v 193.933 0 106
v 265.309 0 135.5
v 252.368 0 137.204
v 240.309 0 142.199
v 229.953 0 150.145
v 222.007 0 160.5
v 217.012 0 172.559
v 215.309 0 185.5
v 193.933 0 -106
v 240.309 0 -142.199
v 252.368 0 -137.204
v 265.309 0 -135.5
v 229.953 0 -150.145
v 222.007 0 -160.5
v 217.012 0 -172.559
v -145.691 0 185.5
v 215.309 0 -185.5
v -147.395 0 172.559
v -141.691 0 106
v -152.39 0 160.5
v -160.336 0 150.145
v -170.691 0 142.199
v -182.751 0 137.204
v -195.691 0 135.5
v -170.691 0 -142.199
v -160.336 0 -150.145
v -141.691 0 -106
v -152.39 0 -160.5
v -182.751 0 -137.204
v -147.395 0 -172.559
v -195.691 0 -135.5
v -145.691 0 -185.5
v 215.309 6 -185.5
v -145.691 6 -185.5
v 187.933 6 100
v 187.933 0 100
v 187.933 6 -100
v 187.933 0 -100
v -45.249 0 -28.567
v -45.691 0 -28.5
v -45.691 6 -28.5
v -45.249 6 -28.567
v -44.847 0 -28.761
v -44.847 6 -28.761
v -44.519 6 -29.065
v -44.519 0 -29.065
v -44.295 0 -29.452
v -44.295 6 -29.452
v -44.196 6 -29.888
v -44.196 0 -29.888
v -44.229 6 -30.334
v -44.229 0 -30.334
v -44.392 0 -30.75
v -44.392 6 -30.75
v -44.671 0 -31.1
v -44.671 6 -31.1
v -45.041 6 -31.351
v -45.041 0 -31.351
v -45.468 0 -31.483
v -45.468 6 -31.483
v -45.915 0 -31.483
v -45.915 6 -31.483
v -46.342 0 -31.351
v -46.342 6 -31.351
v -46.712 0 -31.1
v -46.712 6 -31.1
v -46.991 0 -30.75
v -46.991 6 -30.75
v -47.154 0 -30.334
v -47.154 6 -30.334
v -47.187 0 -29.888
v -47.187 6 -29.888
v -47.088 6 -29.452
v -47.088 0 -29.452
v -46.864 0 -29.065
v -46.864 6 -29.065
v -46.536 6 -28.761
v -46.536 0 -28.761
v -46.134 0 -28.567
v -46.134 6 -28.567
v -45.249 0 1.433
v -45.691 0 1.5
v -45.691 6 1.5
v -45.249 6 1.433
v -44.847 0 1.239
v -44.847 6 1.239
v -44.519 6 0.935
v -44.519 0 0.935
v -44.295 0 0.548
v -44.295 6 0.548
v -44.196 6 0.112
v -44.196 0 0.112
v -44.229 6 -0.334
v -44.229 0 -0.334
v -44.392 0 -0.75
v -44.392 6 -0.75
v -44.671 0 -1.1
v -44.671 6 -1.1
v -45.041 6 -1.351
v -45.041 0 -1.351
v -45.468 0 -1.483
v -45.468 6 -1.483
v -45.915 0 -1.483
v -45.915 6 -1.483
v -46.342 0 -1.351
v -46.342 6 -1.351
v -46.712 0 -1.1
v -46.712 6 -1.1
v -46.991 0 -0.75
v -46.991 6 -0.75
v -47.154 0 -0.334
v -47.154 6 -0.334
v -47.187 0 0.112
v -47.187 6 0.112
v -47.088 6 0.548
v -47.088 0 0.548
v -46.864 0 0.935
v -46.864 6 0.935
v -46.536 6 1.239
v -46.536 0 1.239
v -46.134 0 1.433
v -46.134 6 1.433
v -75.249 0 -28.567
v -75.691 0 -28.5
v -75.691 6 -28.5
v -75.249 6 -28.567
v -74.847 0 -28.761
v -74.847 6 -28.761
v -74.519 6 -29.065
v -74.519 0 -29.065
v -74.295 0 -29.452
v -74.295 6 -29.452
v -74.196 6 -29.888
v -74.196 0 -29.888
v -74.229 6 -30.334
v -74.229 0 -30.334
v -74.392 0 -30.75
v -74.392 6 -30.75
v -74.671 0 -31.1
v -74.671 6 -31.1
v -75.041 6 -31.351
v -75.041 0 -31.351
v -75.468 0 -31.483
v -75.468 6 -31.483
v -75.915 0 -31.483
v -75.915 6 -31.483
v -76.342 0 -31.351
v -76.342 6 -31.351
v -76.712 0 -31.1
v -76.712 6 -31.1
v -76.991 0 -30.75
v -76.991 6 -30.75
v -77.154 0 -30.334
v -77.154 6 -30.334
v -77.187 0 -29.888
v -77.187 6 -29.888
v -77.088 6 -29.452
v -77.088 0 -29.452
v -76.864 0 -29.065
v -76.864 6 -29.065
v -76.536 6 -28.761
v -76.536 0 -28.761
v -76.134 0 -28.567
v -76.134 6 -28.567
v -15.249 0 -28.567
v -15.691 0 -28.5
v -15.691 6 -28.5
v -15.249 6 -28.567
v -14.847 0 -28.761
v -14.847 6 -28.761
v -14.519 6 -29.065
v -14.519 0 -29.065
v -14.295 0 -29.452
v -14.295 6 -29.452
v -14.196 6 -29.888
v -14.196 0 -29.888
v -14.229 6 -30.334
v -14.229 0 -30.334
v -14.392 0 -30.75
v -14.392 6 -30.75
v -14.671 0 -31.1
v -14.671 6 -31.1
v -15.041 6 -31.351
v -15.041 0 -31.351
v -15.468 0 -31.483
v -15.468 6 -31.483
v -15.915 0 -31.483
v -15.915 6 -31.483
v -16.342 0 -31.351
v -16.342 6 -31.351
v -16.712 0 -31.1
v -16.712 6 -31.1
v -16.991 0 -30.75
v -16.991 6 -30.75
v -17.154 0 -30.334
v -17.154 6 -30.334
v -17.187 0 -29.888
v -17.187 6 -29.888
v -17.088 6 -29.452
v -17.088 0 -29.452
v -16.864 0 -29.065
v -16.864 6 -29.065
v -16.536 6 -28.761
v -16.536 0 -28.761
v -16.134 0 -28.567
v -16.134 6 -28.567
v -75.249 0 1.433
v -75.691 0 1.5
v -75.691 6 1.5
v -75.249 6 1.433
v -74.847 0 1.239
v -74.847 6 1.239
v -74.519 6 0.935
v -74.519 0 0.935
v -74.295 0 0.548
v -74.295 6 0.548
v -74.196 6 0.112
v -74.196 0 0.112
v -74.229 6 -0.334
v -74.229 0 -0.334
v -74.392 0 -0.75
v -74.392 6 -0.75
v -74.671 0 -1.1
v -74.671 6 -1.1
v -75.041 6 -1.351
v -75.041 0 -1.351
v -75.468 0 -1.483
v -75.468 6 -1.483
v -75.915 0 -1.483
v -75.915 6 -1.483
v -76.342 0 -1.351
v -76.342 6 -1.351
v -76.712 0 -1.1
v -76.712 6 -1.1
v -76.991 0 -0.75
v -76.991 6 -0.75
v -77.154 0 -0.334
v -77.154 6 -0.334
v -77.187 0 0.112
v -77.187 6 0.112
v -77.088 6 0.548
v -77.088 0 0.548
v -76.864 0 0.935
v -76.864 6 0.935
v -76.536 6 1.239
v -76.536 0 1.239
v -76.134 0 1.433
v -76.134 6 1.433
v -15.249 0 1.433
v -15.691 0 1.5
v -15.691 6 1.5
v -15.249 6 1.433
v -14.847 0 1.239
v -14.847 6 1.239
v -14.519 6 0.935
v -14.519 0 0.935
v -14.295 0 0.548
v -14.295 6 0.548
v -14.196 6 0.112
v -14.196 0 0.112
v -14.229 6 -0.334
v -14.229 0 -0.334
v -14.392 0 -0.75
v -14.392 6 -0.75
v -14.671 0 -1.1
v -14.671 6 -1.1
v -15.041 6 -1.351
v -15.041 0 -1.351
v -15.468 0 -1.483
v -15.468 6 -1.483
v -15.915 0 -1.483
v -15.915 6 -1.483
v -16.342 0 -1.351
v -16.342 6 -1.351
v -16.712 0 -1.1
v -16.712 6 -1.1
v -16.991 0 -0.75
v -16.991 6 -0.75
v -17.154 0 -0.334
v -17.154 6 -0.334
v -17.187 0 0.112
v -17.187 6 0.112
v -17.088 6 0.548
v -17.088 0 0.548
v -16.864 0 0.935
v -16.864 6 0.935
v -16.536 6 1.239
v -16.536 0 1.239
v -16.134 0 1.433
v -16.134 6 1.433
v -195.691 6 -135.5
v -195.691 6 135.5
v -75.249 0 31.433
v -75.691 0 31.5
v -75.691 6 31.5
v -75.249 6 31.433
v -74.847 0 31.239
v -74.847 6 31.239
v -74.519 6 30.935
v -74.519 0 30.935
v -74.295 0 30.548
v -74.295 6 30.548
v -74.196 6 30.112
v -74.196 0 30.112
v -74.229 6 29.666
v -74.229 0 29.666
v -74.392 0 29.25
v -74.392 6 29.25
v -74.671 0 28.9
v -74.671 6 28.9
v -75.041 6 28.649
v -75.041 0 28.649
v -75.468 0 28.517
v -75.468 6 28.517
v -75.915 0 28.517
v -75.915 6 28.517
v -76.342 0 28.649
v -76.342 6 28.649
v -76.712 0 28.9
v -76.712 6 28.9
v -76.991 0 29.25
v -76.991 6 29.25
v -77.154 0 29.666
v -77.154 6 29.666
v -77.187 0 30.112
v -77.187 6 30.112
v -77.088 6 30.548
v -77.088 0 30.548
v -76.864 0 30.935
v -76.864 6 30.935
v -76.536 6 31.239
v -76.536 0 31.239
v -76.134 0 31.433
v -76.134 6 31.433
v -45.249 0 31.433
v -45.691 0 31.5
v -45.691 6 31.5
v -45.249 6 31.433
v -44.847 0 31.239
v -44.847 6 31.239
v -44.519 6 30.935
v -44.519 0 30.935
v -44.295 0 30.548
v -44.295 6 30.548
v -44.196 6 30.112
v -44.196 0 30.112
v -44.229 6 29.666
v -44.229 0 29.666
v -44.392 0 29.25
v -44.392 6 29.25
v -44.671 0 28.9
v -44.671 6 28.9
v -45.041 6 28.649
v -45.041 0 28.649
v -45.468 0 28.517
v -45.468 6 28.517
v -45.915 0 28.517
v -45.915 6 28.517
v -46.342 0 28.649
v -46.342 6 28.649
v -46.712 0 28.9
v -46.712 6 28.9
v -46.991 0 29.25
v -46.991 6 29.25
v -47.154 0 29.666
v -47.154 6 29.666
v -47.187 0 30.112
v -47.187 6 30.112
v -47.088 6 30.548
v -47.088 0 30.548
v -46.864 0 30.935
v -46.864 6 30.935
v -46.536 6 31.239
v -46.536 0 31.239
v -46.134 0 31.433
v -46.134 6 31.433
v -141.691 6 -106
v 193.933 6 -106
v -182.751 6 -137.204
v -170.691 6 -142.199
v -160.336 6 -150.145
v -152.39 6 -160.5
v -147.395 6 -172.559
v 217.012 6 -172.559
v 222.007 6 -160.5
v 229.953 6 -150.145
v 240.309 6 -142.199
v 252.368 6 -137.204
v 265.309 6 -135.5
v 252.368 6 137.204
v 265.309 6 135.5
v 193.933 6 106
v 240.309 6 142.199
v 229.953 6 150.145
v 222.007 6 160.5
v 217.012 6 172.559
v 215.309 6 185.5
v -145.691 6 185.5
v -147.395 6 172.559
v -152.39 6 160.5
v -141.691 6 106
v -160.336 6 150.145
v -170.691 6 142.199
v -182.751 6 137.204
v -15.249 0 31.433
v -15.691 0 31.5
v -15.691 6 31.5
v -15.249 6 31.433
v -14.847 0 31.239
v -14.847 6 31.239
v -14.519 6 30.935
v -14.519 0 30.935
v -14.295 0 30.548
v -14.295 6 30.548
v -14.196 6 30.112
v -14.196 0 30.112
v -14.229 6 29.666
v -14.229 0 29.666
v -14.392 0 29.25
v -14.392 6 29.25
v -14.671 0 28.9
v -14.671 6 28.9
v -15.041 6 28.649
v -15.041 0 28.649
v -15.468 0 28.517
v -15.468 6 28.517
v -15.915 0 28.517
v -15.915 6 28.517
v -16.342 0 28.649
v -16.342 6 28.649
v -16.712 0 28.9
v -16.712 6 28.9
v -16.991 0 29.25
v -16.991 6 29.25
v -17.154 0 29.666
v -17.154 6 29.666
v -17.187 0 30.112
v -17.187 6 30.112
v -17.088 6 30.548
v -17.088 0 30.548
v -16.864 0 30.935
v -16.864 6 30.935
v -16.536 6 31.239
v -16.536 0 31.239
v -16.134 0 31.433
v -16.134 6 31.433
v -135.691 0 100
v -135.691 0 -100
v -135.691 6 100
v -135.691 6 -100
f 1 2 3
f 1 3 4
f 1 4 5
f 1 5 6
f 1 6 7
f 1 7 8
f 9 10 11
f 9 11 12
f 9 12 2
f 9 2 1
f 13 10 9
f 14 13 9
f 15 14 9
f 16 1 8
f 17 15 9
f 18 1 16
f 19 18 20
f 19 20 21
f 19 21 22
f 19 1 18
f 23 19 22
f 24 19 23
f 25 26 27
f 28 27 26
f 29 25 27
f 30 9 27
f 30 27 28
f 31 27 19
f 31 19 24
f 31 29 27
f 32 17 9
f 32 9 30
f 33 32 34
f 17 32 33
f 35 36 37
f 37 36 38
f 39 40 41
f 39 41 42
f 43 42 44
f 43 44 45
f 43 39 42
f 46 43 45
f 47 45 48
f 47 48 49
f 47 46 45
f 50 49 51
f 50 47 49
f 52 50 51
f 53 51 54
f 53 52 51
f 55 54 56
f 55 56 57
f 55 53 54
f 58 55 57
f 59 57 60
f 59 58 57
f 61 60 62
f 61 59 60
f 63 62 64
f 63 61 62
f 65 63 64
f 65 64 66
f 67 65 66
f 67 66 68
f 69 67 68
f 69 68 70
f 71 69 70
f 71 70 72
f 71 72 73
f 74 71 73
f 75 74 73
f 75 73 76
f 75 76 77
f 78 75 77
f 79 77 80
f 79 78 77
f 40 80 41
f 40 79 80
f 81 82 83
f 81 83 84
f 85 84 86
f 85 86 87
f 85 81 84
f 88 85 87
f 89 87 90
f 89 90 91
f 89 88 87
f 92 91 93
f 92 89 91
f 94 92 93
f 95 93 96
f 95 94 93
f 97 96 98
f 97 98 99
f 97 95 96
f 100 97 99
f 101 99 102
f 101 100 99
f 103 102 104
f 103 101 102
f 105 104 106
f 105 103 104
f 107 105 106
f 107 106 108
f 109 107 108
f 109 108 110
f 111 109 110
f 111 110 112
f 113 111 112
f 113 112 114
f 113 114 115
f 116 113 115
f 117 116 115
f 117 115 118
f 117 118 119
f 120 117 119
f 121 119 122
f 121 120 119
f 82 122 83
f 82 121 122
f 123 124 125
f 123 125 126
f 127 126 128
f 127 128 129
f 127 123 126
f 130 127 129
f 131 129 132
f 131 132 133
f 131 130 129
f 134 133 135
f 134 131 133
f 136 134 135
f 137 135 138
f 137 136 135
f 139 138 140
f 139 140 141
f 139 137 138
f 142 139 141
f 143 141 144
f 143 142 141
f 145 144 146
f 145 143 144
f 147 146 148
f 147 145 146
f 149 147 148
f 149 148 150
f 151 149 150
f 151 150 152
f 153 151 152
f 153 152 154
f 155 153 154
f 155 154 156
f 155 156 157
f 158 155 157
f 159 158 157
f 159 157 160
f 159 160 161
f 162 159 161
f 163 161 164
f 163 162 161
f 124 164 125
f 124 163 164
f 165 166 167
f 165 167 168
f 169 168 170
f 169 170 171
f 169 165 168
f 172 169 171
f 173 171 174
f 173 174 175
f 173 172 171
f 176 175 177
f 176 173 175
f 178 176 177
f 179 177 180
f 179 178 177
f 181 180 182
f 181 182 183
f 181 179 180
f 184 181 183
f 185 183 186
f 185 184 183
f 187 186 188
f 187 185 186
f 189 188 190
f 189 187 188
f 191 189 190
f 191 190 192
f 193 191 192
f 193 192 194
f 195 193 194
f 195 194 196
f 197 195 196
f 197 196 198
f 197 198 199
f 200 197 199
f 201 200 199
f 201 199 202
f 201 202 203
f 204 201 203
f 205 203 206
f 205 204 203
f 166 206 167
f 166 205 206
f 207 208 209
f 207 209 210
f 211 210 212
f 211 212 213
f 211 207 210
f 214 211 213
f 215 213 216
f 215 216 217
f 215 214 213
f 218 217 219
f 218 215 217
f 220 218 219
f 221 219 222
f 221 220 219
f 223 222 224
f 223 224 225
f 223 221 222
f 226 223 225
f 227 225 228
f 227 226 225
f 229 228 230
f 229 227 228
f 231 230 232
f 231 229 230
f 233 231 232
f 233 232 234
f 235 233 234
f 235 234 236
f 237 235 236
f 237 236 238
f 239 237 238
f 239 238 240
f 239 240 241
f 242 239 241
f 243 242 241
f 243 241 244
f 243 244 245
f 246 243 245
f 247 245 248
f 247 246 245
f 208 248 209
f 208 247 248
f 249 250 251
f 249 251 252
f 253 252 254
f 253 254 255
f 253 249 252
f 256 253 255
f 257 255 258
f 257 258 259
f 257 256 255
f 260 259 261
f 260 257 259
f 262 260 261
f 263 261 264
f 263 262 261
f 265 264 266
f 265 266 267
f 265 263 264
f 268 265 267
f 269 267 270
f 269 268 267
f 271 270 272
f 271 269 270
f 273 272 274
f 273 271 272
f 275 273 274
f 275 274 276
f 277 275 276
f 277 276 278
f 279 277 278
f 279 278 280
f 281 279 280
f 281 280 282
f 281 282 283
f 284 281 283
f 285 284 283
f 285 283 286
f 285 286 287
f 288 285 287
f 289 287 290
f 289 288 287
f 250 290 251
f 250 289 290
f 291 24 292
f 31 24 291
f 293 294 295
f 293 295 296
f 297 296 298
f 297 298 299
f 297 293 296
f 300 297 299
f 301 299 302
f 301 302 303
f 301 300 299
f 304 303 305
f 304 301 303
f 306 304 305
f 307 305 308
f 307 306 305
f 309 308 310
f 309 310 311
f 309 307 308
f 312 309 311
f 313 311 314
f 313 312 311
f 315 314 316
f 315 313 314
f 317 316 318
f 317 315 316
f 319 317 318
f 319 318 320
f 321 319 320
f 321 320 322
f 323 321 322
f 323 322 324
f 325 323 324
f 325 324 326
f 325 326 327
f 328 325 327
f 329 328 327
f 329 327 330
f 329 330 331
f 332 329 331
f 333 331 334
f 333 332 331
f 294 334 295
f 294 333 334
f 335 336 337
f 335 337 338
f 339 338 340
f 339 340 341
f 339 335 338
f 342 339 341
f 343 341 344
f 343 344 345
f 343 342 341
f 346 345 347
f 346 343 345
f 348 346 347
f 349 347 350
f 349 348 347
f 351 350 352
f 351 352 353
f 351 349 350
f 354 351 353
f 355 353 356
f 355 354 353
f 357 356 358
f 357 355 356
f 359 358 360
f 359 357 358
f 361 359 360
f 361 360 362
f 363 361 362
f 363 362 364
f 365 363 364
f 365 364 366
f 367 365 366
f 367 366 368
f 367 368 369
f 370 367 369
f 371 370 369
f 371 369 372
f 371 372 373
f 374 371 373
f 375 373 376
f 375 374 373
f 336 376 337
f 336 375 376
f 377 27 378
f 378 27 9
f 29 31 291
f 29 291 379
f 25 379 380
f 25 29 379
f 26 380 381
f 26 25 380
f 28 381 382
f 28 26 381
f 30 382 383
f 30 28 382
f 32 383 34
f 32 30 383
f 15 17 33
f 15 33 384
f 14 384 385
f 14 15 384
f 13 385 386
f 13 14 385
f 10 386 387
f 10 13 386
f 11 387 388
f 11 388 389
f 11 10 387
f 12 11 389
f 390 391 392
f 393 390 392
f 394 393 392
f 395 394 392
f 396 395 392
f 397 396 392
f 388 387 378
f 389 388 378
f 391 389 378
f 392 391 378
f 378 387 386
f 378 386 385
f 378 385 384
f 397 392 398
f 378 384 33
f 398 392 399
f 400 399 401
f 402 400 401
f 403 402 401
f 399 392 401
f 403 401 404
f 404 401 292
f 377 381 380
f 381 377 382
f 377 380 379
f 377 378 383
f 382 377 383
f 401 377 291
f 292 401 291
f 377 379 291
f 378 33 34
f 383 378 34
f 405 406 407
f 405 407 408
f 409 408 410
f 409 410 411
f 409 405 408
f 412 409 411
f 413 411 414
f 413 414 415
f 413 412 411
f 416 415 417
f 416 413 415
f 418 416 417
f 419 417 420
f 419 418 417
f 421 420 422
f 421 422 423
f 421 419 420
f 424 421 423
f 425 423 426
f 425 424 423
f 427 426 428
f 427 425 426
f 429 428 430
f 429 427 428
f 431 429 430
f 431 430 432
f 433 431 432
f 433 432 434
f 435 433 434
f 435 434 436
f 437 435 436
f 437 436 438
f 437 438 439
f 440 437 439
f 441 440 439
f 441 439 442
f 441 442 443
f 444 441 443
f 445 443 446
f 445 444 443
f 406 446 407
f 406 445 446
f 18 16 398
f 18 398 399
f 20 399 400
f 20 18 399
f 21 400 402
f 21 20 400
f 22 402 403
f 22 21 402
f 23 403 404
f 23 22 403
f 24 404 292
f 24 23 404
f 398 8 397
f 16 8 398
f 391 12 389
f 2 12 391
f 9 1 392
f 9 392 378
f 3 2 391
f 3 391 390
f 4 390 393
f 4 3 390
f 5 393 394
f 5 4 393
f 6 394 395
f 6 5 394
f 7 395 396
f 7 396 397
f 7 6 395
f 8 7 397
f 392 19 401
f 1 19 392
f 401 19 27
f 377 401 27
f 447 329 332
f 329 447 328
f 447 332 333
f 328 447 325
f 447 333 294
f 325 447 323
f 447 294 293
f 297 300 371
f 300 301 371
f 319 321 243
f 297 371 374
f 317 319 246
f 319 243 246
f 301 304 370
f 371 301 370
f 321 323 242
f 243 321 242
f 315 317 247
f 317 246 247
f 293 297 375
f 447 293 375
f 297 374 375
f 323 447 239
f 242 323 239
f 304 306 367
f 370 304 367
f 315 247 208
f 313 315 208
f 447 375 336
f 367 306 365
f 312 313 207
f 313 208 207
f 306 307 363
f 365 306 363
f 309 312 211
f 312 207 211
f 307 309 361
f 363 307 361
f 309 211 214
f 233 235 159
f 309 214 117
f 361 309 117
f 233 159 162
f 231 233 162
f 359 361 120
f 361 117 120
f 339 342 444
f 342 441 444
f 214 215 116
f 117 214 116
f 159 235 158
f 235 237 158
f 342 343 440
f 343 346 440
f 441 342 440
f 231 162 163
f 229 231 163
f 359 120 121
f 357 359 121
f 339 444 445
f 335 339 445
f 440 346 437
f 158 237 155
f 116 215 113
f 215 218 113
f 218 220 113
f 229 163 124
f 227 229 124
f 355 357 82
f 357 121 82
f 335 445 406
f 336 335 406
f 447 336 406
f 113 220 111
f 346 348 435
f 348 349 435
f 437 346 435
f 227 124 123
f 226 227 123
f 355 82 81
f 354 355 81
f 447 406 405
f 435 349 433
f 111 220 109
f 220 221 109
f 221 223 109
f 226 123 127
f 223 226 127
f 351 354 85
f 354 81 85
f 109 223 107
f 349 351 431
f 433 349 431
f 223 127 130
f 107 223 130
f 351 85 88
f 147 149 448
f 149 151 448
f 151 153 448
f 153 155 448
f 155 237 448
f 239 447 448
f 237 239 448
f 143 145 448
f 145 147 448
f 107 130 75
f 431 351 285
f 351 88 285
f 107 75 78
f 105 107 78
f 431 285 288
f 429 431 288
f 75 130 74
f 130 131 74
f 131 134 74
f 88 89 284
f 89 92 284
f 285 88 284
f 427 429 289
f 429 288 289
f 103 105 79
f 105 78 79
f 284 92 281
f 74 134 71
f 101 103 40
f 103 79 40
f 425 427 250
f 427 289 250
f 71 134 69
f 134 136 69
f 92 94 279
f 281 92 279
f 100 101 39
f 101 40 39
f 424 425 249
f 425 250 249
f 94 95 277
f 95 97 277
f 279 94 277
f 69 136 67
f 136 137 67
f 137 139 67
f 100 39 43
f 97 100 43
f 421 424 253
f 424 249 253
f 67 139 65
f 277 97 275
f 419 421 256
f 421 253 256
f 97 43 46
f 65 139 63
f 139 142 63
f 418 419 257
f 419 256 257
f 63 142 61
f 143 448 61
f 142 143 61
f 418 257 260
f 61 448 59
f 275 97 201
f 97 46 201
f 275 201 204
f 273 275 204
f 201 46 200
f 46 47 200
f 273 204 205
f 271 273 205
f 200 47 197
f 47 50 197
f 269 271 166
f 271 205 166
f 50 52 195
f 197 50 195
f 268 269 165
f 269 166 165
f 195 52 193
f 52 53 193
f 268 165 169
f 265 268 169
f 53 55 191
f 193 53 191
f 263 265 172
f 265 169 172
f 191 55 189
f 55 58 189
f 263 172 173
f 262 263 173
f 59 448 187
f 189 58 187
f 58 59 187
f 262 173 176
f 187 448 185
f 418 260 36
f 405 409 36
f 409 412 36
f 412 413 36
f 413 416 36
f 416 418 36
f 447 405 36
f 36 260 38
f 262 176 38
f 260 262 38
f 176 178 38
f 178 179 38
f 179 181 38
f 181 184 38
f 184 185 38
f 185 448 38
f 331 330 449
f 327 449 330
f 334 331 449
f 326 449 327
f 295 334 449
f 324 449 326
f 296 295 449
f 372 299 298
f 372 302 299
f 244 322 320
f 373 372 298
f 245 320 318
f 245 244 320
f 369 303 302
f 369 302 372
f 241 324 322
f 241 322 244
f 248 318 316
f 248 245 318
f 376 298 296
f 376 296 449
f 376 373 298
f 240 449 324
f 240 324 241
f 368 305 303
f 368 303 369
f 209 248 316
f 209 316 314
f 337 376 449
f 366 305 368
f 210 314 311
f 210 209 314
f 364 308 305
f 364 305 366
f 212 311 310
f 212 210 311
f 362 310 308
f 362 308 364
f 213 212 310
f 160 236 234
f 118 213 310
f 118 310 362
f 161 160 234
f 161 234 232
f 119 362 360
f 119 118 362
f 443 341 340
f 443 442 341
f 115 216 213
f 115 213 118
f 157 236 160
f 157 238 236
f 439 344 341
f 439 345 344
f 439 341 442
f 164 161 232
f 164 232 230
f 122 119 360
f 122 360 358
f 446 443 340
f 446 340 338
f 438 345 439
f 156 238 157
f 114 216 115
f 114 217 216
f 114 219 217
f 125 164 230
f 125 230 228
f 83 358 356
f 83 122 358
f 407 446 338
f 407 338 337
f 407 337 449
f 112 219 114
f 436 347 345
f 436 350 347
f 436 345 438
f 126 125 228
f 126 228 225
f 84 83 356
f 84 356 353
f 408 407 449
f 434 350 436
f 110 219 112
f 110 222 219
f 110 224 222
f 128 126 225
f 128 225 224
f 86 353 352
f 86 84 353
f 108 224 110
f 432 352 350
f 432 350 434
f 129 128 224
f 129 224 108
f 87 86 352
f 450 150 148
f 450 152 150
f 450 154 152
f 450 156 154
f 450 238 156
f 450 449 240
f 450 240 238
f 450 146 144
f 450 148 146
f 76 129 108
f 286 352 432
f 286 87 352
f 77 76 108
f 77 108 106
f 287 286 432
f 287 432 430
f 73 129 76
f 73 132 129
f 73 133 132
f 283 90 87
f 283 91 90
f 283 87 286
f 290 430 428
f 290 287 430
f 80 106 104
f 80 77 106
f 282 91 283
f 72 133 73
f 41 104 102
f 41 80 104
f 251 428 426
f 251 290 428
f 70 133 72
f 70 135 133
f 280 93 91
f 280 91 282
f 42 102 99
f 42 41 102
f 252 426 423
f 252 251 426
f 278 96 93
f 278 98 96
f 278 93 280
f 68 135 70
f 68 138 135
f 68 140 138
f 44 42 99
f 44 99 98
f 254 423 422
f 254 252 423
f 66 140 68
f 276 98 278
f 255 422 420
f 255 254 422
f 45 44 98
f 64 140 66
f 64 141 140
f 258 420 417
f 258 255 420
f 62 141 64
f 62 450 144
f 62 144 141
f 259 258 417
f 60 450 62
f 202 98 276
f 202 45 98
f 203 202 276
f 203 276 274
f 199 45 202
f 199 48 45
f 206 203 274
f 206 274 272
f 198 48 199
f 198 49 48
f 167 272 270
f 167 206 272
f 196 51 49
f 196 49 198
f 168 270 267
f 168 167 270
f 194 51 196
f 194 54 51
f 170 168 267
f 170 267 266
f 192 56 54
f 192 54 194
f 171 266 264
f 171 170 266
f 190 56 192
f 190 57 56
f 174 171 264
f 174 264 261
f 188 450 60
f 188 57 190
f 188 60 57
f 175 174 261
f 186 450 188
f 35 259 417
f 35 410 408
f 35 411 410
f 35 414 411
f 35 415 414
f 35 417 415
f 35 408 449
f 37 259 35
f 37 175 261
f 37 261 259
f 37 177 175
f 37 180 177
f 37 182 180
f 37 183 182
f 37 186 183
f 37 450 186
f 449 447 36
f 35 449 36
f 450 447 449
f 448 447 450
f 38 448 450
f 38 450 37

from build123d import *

# Parameters (mm, degrees)
SKETCH_1_W        = 335.624595469
SKETCH_1_H        = 212
EXTRUDE_1_DEPTH   = 6
SKETCH_1_W_2      = 323.624595469
SKETCH_1_H_2      = 200
SKETCH_1_R        = 1.5
EXTRUDE_1_2_DEPTH = 6


with BuildPart() as part:
    # 草图1 → 凸台-拉伸1 (new body)
    with BuildSketch(Plane(origin=(0, 0, 0), x_dir=(1, 0, 0), z_dir=(0, 1, 0))):
        with BuildLine():
            ThreePointArc((-145.691499512, -185.5), (-160.336160453, -150.144660941), (-195.691499512, -135.5))
            Line((-195.691499512, -135.5), (-195.691499512, 135.5))
            ThreePointArc((-195.691499512, 135.5), (-160.336160453, 150.144660941), (-145.691499512, 185.5))
            Line((-145.691499512, 185.5), (215.308500488, 185.5))
            ThreePointArc((215.308500488, 185.5), (229.953161429, 150.144660941), (265.308500488, 135.5))
            Line((265.308500488, 135.5), (265.308500488, -135.5))
            ThreePointArc((265.308500488, -135.5), (229.953161429, -150.144660941), (215.308500488, -185.5))
            Line((215.308500488, -185.5), (-145.691499512, -185.5))
        make_face()
        with Locations((26.120798222, 0)):
            Rectangle(SKETCH_1_W, SKETCH_1_H, mode=Mode.SUBTRACT)
    extrude(amount=EXTRUDE_1_DEPTH)


with BuildPart() as body_2:
    # 草图1 → Extrude 1 2 (new body)
    with BuildSketch(Plane(origin=(0, 0, 0), x_dir=(1, 0, 0), z_dir=(0, 1, 0))):
        with Locations((26.120798222, 0)):
            Rectangle(SKETCH_1_W_2, SKETCH_1_H_2)
        with Locations(Location((-15.691499512, 0, 0), (0, 0, 270))):
            Circle(SKETCH_1_R, mode=Mode.SUBTRACT)
        with Locations(Location((-15.691499512, -30, 0), (0, 0, 270))):
            Circle(SKETCH_1_R, mode=Mode.SUBTRACT)
        with Locations(Location((-45.691499512, -30, 0), (0, 0, 270))):
            Circle(SKETCH_1_R, mode=Mode.SUBTRACT)
        with Locations(Location((-45.691499512, 0, 0), (0, 0, 270))):
            Circle(SKETCH_1_R, mode=Mode.SUBTRACT)
        with Locations(Location((-45.691499512, 30, 0), (0, 0, 270))):
            Circle(SKETCH_1_R, mode=Mode.SUBTRACT)
        with Locations(Location((-75.691499512, 30, 0), (0, 0, 270))):
            Circle(SKETCH_1_R, mode=Mode.SUBTRACT)
        with Locations(Location((-75.691499512, 0, 0), (0, 0, 270))):
            Circle(SKETCH_1_R, mode=Mode.SUBTRACT)
        with Locations(Location((-75.691499512, -30, 0), (0, 0, 270))):
            Circle(SKETCH_1_R, mode=Mode.SUBTRACT)
        with Locations(Location((-15.691499512, 30, 0), (0, 0, 270))):
            Circle(SKETCH_1_R, mode=Mode.SUBTRACT)
    extrude(amount=EXTRUDE_1_2_DEPTH)


solid = Compound([part.part, body_2.part])
